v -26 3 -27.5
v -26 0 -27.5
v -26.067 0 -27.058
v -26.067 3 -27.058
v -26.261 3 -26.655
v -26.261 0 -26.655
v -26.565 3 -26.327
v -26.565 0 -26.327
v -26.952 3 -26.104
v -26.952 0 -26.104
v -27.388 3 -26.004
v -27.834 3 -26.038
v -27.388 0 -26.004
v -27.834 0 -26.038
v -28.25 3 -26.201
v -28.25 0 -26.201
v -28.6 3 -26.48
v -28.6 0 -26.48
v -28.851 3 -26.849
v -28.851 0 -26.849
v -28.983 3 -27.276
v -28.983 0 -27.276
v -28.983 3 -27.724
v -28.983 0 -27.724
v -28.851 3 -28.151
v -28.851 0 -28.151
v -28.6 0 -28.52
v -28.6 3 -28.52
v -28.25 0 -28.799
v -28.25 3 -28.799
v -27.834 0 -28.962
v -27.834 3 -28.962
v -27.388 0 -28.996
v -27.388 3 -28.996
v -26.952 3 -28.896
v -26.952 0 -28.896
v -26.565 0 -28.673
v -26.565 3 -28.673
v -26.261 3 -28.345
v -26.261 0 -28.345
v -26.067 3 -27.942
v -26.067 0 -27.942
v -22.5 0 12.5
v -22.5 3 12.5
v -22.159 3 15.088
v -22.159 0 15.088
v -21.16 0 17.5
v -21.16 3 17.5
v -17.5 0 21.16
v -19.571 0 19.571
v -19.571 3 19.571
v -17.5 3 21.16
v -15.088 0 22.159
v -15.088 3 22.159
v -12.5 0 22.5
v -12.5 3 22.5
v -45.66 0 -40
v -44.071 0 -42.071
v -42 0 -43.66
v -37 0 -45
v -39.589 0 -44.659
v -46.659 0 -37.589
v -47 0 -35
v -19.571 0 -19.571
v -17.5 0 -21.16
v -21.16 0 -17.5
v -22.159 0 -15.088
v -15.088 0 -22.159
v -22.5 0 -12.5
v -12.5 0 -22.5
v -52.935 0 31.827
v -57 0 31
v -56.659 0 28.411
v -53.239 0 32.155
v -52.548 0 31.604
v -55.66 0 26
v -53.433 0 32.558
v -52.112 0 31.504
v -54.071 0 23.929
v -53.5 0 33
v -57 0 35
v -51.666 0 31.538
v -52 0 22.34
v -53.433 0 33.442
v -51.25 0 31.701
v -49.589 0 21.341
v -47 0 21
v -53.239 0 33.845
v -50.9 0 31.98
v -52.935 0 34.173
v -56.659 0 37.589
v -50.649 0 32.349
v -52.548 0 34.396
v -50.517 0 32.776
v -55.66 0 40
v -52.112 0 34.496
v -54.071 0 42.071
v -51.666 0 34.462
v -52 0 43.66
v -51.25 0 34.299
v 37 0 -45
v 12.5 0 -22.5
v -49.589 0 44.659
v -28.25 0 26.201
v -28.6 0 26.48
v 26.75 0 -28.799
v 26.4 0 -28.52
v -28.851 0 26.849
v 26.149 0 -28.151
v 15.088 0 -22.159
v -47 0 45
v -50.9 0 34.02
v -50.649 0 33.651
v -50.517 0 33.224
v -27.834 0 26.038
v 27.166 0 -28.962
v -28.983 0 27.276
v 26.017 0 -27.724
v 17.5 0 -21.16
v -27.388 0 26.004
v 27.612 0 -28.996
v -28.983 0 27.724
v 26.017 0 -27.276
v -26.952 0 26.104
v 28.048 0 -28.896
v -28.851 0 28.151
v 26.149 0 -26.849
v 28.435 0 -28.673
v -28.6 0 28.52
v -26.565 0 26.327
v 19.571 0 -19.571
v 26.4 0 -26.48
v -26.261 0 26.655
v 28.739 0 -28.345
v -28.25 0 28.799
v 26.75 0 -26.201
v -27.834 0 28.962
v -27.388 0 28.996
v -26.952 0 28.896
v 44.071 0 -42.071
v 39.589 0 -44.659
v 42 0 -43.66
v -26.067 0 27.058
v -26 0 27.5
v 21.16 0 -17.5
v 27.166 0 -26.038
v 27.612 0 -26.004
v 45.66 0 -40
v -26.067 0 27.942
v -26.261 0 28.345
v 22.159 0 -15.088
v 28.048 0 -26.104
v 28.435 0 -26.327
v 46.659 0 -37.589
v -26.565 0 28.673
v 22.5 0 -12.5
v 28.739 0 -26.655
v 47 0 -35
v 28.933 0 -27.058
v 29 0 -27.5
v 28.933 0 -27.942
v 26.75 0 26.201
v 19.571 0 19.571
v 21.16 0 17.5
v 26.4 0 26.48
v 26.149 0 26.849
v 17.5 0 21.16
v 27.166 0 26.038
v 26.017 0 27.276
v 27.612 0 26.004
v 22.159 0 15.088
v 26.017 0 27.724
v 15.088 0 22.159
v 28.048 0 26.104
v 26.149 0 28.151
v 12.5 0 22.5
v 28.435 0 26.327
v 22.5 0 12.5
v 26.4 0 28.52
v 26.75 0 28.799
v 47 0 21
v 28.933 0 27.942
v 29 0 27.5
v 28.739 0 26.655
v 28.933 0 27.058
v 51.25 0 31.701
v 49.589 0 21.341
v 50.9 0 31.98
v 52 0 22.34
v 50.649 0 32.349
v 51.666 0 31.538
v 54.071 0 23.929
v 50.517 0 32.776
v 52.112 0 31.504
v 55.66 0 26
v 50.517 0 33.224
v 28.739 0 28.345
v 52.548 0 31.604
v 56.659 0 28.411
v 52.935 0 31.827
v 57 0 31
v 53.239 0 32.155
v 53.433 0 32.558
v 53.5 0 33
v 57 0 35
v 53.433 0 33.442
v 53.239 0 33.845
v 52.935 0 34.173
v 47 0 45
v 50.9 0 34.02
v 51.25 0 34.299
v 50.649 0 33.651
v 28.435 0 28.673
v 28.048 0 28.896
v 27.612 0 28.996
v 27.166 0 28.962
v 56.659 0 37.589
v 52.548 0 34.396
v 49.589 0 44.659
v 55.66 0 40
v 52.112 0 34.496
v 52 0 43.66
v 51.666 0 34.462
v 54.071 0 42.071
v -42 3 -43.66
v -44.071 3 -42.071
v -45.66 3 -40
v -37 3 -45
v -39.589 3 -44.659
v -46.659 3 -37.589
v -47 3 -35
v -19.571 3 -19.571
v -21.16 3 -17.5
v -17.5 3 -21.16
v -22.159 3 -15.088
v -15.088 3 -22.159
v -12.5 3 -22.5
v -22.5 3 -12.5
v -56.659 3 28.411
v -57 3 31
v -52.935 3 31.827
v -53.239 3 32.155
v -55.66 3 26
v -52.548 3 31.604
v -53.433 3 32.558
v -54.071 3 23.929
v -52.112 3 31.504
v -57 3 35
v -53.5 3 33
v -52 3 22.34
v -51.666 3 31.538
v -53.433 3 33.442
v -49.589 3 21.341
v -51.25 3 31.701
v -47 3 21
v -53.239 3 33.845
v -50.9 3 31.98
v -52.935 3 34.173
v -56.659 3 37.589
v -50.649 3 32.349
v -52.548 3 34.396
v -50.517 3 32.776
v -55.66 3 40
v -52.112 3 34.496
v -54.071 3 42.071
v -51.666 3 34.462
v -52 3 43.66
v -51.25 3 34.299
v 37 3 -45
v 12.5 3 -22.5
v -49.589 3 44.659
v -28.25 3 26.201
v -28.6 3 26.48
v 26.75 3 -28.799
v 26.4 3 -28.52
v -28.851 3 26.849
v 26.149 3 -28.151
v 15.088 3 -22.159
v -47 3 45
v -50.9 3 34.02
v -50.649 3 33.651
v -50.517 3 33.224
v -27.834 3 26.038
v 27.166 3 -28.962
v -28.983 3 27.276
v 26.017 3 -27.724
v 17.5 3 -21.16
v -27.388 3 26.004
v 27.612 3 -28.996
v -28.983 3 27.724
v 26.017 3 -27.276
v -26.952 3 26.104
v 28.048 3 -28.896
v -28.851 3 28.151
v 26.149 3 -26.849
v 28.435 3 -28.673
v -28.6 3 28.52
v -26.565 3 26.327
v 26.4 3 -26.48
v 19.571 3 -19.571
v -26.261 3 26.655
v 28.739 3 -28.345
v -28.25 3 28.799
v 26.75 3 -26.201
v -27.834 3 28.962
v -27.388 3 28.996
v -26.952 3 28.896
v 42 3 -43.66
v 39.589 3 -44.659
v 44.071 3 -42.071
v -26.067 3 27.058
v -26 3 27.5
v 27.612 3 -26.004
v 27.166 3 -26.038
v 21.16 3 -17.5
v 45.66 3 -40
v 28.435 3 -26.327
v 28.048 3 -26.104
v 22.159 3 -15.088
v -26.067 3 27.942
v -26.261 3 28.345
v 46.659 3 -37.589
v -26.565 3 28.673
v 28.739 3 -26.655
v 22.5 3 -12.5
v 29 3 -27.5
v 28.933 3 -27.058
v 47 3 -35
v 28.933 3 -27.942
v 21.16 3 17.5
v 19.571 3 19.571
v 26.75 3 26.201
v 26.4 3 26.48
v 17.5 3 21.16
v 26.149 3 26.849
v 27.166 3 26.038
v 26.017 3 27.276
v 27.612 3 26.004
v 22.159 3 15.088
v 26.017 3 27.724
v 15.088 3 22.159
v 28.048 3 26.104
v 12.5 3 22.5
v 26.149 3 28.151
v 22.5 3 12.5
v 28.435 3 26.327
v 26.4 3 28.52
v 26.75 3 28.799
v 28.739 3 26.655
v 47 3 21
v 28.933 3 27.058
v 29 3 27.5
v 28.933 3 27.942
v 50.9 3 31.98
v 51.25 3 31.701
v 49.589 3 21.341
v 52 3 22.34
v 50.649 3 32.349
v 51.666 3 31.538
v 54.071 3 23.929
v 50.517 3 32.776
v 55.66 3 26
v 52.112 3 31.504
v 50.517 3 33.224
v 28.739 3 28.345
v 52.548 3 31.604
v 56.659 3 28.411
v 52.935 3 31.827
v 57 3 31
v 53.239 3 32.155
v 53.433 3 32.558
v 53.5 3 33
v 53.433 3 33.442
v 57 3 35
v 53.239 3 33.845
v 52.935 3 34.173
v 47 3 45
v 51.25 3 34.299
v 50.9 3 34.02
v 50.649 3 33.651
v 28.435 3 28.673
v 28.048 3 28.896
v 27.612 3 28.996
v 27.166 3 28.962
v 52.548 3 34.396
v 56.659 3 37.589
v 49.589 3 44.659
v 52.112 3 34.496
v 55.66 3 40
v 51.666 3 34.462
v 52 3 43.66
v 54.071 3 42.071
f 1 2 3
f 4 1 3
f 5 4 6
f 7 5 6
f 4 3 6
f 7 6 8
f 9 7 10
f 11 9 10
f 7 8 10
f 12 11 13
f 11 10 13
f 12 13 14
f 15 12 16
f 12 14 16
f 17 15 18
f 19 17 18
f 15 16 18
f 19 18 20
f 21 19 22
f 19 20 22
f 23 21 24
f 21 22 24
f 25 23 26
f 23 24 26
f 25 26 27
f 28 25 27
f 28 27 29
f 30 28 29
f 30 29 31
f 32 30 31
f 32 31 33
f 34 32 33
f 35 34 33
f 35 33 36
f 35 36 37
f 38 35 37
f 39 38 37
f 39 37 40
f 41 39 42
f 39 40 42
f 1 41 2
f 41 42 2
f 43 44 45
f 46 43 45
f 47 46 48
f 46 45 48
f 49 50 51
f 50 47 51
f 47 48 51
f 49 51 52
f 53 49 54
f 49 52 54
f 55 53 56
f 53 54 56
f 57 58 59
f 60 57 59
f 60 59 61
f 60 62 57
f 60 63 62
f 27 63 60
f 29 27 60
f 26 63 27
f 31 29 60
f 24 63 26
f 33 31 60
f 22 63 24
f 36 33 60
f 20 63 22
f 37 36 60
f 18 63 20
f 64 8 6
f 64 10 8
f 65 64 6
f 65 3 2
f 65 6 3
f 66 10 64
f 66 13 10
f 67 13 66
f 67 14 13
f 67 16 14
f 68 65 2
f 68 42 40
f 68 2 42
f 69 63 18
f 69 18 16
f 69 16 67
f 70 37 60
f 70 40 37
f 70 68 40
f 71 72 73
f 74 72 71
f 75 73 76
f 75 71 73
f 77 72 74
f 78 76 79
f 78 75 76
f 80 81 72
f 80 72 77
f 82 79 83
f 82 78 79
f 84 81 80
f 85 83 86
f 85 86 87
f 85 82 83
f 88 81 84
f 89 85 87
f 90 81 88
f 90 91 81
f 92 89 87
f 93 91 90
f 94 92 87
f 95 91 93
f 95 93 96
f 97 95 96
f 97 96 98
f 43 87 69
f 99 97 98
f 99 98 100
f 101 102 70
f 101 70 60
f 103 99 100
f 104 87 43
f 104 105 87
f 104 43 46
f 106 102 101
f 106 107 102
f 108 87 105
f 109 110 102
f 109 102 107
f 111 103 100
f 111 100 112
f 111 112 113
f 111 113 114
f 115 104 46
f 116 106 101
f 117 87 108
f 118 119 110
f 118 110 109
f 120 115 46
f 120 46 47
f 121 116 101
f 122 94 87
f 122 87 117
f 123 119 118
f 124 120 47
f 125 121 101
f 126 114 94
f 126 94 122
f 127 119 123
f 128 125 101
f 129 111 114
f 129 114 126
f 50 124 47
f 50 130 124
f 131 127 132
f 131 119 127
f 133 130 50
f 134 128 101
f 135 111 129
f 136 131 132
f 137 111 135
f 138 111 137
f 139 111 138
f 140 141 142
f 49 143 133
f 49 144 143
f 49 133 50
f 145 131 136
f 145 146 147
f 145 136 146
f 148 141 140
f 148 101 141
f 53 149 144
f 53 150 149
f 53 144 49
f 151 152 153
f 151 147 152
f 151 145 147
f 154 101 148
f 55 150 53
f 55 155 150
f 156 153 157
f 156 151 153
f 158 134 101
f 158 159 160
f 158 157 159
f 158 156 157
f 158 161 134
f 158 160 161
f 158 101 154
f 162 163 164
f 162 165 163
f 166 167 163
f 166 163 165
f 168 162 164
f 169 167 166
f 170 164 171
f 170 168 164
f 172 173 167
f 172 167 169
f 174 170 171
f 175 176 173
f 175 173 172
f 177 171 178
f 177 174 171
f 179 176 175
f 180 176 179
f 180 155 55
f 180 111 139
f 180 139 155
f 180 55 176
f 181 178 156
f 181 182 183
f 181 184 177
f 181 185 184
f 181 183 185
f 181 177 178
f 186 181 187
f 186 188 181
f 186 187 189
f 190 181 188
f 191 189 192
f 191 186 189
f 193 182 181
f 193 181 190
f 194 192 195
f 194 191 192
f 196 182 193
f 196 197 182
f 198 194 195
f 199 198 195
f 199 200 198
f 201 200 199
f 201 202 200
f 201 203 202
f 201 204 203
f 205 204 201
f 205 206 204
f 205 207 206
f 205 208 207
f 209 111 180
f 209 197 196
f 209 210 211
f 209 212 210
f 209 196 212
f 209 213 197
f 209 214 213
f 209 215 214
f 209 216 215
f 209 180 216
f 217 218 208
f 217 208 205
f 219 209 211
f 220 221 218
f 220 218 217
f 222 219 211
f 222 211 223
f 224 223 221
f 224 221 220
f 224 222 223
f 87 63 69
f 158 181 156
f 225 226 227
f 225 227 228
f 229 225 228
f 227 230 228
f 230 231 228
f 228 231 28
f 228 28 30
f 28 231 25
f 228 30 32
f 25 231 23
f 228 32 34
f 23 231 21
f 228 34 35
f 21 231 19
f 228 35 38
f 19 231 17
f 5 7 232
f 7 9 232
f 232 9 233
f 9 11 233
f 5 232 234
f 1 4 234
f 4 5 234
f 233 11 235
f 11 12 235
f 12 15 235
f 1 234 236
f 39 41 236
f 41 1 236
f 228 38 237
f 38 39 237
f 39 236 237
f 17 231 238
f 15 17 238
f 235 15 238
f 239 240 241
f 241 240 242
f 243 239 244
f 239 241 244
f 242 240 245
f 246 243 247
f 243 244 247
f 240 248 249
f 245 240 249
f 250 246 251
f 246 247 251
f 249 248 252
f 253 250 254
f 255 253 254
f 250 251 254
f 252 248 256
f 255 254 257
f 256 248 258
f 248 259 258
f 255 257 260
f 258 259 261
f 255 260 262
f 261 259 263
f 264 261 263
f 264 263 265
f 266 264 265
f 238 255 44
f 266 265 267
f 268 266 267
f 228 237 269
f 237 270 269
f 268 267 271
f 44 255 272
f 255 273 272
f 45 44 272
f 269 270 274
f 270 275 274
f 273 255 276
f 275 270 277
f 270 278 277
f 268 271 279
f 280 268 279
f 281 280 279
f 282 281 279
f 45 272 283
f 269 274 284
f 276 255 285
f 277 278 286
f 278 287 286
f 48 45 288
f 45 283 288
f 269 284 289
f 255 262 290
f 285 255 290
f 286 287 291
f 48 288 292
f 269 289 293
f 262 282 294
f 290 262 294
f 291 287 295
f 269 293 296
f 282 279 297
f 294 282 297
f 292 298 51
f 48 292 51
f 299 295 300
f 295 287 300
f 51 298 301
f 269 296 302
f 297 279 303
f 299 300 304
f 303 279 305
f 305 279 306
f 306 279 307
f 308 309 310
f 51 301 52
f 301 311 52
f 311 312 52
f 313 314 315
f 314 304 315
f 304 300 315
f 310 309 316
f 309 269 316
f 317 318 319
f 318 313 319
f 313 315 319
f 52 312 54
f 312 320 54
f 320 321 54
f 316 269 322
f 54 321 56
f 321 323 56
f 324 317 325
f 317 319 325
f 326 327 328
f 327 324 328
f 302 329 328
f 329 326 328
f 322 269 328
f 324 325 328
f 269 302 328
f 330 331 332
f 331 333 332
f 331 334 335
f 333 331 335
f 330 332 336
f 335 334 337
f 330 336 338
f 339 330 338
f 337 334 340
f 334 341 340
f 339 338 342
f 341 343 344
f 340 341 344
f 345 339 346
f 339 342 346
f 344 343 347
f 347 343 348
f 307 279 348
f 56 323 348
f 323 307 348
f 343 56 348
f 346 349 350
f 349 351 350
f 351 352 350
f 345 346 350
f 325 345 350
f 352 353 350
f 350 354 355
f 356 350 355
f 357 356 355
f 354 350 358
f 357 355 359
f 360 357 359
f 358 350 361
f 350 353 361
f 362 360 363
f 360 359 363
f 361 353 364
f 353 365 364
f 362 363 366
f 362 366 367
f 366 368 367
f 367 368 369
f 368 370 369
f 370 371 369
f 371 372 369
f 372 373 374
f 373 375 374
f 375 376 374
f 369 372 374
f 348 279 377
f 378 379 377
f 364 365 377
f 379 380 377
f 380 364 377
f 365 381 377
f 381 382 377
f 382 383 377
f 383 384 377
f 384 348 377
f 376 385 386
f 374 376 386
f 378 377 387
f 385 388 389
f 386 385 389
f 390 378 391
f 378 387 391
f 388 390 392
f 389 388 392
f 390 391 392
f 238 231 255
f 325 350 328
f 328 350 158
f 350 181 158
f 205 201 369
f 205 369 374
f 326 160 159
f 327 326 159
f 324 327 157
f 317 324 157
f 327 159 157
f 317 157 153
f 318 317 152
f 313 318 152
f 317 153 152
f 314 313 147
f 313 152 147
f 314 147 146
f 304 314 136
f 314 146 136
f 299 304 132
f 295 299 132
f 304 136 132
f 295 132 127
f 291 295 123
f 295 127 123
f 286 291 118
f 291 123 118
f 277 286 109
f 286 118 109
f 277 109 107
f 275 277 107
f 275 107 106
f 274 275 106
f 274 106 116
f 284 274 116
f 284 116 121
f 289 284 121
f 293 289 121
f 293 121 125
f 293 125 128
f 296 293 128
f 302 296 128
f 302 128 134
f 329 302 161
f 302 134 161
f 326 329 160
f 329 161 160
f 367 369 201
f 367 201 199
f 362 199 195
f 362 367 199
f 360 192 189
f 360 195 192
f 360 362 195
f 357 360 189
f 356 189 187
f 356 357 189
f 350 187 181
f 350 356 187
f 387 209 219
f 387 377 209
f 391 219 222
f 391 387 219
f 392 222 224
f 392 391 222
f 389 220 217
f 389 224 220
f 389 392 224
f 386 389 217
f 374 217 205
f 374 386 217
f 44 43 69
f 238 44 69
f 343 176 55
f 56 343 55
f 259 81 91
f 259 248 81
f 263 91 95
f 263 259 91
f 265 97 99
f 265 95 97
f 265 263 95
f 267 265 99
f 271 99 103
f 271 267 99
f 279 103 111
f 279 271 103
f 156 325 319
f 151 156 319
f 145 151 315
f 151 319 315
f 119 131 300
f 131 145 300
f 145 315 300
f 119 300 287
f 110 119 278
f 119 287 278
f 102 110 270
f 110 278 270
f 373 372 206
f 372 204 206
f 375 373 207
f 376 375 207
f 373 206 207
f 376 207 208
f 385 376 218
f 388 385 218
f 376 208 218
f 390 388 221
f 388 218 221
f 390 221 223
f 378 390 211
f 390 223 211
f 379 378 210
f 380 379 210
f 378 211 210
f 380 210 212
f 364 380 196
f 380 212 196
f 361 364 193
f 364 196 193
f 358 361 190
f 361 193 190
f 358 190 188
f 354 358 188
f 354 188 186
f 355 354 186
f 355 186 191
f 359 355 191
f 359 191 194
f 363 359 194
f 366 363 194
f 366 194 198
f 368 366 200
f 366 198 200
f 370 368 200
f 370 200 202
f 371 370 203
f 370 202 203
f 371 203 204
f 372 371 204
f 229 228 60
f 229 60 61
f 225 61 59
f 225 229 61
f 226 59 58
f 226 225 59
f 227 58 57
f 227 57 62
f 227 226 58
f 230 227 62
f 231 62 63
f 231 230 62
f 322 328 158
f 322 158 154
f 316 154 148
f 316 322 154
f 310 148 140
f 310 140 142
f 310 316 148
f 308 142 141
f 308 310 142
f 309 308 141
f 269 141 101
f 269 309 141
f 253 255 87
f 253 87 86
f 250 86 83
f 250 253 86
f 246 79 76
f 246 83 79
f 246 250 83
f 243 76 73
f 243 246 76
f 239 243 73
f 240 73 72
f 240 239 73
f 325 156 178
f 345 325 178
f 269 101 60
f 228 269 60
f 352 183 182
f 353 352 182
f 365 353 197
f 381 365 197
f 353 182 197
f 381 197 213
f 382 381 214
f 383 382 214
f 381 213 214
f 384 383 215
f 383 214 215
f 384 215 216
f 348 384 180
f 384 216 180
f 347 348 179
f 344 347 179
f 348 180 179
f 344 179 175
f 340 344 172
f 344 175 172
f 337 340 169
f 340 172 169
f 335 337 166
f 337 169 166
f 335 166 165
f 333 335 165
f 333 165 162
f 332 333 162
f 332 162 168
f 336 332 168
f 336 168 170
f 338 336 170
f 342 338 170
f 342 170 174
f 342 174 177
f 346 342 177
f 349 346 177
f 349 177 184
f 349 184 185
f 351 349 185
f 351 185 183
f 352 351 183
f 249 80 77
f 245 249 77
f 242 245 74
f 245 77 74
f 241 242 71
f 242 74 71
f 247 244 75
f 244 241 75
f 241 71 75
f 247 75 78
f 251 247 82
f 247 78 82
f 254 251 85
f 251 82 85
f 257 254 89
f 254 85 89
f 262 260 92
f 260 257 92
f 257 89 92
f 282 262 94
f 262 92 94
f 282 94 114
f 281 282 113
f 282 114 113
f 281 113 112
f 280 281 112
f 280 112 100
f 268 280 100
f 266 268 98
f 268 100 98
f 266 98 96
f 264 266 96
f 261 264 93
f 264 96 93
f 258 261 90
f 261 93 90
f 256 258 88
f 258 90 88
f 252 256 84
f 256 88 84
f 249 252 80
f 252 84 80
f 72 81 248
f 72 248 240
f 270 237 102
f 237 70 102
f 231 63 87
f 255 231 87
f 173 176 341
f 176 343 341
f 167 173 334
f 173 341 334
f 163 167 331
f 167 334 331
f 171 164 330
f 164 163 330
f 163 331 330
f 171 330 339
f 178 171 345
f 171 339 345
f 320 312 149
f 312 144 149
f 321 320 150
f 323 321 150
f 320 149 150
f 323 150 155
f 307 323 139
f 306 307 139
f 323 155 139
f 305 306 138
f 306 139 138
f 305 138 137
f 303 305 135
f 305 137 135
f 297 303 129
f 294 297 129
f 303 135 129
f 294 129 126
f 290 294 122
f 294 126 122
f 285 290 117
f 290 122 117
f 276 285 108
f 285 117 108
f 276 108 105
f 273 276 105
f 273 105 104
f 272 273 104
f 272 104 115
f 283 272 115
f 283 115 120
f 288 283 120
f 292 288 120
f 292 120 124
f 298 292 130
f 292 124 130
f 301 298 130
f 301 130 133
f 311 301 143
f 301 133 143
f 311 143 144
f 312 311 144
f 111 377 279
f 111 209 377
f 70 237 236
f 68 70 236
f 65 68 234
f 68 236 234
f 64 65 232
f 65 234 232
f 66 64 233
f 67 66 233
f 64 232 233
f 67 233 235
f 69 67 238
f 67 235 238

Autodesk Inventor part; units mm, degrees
ref_plane "YZ Plane" through (0, 0, 0) normal (1, 0, 0) x (0, 1, 0)
ref_plane "XZ Plane" through (0, 0, 0) normal (0, 1, 0) x (-1, 0, 0)
ref_plane "XY Plane" through (0, 0, 0) normal (0, 0, 1) x (1, 0, 0)
sketch "Sketch1" plane through (0, 0, 0) normal (0, 1, 0) x (-1, 0, 0)
  line L0 (-47, -45) -> (47, -45)
  line L1 (47, -45) -> (47, 45)
  line L2 (47, 45) -> (-47, 45)
  line L3 (-47, 45) -> (-47, -45)
  line L4 (-47, -45) -> (47, 45) construction
  line L5 (47, -45) -> (-47, 45) construction
  point P0 (0, 0)
  dimension "d0" = 94
  dimension "d1" = 90
extrude "Extrusion1" add sketch "Sketch1" along normal blind 3
sketch "Sketch2" plane through (0, 0, 0) normal (0, -1, 0) x (1, 0, 0)
  line L0 (-47, 45) -> (-57, 45)
  line L1 (-57, 45) -> (-57, 21)
  line L2 (-57, 21) -> (-47, 21)
  line L3 (-47, 21) -> (-47, 45)
  line L4 (47, -45) -> (-47, -45) projected
  point P0 (0, 0)
  dimension "d4" = 10
  dimension "d5" = 66
extrude "Extrusion2" add sketch "Sketch2" against normal blind 3
sketch "Sketch3" plane through (0, 0, 0) normal (0, -1, 0) x (1, 0, 0)
  line L0 (-30, 30) -> (30, 30) construction
  line L1 (30, 30) -> (30, -30) construction
  line L2 (30, -30) -> (-30, -30) construction
  line L3 (-30, -30) -> (-30, 30) construction
  line L4 (-30, 30) -> (30, -30) construction
  line L5 (30, 30) -> (-30, -30) construction
  circle A0 centre (-27.5, -27.5) radius 1.5
  circle A1 centre (27.5, -27.5) radius 1.5
  circle A2 centre (27.5, 27.5) radius 1.5
  circle A3 centre (-27.5, 27.5) radius 1.5
  point P0 (0, 0)
  dimension "d8" = 60
  dimension "d9" = 60
  dimension "d10" = 3
  dimension "d11" = 27.5
  dimension "d14" = 360
extrude "Extrusion3" cut sketch "Sketch3" against normal blind 3
sketch "Sketch4" plane through (0, 0, 0) normal (0, -1, 0) x (1, 0, 0)
  line L0 (22.5, 22.5) -> (-22.5, 22.5)
  line L1 (-22.5, 22.5) -> (-22.5, -22.5)
  line L2 (-22.5, -22.5) -> (22.5, -22.5)
  line L3 (22.5, -22.5) -> (22.5, 22.5)
  line L4 (22.5, 22.5) -> (-22.5, -22.5) construction
  line L5 (-22.5, 22.5) -> (22.5, -22.5) construction
  point P0 (0, 0)
  dimension "d18" = 45
  dimension "d19" = 45
extrude "Extrusion4" cut sketch "Sketch4" against normal blind 3
fillet "Fillet1" radius 10 3 edges at (-57, 1.5, 21) (-57, 1.5, 45) (-47, 1.5, -45)
mirror "Mirror1" about plane through (0, 0, 0) normal (1, 0, 0) of "Extrusion2", "Fillet1"
fillet "Fillet2" radius 10 4 edges at (-22.5, 1.5, -22.5) (22.5, 1.5, -22.5) (22.5, 1.5, 22.5) (-22.5, 1.5, 22.5)
sketch "Sketch5" plane through (0, 0, 0) normal (0, -1, 0) x (1, 0, 0)
  circle A0 centre (52, 33) radius 1.5
  line L0 (57, 35) -> (57, 31) projected
  point P0 (0, 0)
  point P1 (57, 33)
  dimension "d24" = 3
  dimension "d25" = 5
extrude "Extrusion5" cut sketch "Sketch5" against normal blind 3
mirror "Mirror2" about plane through (0, 0, 0) normal (1, 0, 0) of "Extrusion5"
properties part number "Bolt Cradel"
